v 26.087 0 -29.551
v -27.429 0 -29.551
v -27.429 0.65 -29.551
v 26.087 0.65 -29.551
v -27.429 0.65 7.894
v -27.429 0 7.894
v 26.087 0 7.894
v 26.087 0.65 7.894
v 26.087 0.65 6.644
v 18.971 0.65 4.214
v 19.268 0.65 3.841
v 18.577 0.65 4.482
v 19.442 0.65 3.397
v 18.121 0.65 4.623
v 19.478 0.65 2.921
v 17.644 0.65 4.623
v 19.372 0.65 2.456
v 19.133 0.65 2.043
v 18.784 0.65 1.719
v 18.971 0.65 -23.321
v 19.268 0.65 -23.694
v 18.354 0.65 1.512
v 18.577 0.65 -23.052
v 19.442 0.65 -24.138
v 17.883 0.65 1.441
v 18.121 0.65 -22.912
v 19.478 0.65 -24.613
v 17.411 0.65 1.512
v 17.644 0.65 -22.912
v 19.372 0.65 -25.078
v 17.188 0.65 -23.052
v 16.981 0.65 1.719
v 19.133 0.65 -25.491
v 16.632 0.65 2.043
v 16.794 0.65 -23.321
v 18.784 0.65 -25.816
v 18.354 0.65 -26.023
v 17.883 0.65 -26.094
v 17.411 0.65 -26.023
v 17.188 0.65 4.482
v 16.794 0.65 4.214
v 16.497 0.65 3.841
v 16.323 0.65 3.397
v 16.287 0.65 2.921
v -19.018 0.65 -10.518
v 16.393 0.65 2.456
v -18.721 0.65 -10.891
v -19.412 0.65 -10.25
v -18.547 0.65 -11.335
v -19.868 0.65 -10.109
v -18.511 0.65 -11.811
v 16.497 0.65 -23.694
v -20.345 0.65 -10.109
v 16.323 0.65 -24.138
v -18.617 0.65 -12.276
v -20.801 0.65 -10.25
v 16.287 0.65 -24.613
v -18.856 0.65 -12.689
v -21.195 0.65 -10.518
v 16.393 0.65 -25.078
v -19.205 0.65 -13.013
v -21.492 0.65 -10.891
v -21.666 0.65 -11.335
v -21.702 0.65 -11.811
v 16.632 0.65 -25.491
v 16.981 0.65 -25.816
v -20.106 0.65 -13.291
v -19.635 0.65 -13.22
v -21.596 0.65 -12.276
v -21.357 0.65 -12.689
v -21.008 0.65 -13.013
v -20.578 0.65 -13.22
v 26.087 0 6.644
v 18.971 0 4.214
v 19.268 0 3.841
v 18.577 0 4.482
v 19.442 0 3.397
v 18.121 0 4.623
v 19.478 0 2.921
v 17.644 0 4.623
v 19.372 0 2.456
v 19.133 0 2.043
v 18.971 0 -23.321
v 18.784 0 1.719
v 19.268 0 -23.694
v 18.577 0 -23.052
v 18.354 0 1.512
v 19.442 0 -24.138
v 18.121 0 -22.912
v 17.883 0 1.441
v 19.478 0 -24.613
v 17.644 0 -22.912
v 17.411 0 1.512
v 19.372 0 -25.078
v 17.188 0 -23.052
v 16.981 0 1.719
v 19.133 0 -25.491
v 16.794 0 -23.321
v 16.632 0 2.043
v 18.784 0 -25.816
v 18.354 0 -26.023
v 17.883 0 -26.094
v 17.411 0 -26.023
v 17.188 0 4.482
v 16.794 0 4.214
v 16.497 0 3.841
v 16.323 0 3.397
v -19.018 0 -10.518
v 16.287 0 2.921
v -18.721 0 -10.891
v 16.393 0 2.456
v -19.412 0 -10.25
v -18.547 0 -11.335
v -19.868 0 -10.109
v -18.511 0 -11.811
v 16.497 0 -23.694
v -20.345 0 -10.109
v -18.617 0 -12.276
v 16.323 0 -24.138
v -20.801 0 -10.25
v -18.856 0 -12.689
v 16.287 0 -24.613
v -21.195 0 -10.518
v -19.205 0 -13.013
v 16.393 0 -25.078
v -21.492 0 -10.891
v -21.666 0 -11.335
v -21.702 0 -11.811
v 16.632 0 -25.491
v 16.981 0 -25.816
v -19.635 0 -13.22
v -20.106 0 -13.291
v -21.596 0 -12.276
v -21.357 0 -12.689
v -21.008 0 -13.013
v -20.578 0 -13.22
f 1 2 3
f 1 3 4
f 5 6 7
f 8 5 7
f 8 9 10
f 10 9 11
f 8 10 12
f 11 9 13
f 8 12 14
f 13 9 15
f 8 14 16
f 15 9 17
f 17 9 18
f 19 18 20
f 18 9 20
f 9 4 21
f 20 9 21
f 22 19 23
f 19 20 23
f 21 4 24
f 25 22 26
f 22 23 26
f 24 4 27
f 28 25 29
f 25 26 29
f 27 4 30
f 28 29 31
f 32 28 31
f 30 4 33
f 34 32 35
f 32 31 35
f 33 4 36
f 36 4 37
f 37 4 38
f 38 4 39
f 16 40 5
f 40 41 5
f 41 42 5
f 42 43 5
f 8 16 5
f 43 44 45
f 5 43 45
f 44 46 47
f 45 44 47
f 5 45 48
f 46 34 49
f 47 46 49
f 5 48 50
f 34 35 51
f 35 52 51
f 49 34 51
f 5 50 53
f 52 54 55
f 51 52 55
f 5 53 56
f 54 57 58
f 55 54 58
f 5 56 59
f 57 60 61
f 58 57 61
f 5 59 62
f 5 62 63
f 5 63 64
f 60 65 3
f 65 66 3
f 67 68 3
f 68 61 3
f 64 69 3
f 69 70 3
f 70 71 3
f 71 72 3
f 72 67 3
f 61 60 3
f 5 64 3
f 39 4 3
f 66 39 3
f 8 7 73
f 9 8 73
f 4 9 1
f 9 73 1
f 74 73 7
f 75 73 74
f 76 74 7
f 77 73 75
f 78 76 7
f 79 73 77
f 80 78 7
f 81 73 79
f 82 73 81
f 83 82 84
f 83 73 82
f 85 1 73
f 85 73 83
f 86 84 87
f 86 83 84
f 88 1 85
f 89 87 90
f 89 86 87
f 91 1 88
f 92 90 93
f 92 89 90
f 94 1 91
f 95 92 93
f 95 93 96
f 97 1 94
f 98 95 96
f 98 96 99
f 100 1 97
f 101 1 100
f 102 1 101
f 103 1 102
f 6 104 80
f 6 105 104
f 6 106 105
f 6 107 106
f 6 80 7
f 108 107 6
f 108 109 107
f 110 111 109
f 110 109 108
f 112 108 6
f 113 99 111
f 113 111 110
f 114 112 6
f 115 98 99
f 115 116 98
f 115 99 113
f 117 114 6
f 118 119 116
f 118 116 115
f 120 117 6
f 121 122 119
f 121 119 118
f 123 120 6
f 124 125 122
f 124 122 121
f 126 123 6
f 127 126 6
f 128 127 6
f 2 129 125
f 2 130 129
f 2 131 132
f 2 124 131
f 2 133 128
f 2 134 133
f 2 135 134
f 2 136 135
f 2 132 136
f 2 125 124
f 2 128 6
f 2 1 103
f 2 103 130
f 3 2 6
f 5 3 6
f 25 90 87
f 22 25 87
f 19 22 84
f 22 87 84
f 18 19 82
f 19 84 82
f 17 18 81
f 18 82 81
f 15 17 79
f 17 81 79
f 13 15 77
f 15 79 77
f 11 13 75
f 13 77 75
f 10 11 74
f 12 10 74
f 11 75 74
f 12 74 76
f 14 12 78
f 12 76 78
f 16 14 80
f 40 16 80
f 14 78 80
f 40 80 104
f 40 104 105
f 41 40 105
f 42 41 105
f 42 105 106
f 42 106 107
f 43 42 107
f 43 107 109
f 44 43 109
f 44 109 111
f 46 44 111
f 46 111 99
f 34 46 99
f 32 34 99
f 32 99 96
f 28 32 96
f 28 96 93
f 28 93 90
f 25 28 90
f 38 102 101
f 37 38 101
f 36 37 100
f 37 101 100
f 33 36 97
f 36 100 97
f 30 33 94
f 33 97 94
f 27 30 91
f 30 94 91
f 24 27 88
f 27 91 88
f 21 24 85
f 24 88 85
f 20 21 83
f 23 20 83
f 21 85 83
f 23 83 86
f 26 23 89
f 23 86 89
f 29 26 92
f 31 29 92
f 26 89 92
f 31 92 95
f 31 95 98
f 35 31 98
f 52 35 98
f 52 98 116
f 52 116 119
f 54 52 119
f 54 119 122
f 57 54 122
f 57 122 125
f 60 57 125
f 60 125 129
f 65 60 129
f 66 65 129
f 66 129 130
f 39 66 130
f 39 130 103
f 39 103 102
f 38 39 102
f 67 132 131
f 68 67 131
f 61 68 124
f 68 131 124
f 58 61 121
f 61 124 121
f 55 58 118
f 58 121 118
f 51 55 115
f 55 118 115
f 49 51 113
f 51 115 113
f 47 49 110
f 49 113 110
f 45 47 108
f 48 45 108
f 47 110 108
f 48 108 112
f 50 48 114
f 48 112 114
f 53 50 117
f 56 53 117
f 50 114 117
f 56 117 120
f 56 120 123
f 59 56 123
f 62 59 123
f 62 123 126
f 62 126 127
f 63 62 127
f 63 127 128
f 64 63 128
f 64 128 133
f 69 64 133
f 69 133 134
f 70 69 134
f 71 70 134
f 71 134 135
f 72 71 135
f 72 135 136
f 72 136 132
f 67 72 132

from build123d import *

# Parameters (mm, degrees)
SKETCH1_W           = 53.515278819
SKETCH1_H           = 1.25
BOSS_EXTRUDE1_DEPTH = 0.65
SKETCH2_R           = 1.6
CUT_EXTRUDE1_DEPTH  = 41.32396752


with BuildPart() as part:
    # Sketch1 → Boss-Extrude1 (new body)
    with BuildSketch(Plane(origin=(0, 0, 0), x_dir=(1, 0, 0), z_dir=(0, 1, 0))):
        Polygon((-27.428763177, -6.643775098), (-27.428763177, 29.222168516), (-27.428763177, 29.551020407), (26.086515642, 29.551020407), (26.086515642, 28.356224902), (26.086515642, -6.643775098), align=None)
        with Locations((-0.671123767, -7.268775098)):
            Rectangle(SKETCH1_W, SKETCH1_H)
    extrude(amount=BOSS_EXTRUDE1_DEPTH)

    # Sketch2 → Cut-Extrude1 (cut, through all)
    with BuildSketch(Plane.XZ):
        with Locations(Location((-20.106484358, -11.691224902, 0), (0, 0, 270))):
            Circle(SKETCH2_R)
        with Locations(Location((17.882515642, -24.493824902, 0), (0, 0, 270))):
            Circle(SKETCH2_R)
        with Locations(Location((17.882515642, 3.040775098, 0), (0, 0, 270))):
            Circle(SKETCH2_R)
    extrude(amount=-CUT_EXTRUDE1_DEPTH, mode=Mode.SUBTRACT)


solid = part.part
